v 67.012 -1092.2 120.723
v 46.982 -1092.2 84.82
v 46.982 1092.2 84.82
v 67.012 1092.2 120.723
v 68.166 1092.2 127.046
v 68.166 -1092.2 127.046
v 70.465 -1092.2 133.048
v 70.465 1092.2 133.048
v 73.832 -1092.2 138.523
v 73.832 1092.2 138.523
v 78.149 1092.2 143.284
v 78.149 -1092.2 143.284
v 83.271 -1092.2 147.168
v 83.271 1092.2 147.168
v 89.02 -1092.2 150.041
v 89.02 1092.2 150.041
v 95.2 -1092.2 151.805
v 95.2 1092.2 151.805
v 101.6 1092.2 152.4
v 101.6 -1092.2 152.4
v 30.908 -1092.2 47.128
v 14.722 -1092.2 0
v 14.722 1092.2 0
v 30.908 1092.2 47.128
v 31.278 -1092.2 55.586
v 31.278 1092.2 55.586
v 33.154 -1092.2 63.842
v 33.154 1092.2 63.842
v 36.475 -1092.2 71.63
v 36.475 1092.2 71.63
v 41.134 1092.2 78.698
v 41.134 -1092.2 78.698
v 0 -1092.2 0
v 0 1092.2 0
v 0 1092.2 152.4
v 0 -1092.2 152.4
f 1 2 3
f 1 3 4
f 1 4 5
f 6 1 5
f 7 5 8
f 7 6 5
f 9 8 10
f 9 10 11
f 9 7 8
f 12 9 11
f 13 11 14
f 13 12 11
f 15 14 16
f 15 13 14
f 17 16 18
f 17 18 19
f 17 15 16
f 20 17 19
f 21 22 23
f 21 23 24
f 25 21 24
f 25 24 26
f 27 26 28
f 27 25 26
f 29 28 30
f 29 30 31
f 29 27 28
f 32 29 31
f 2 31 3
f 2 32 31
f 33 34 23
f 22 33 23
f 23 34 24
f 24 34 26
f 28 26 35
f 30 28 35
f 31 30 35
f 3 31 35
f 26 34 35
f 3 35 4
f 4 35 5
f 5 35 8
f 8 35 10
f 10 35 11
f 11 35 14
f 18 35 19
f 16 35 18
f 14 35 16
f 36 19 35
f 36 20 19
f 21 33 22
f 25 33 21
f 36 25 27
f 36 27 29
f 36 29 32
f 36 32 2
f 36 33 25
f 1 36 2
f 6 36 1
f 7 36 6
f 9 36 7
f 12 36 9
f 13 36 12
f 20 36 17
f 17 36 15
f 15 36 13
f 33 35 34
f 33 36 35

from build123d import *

# Parameters (mm, degrees)
F1_DEPTH = 1092.2


with BuildPart() as f1:
    # F0 (on Front) → F1 (new body, symmetric)
    with BuildSketch(Plane.XZ):
        with BuildLine():
            Line((0, 152.4), (0, 0))
            Line((0, 0), (14.721692, 0))
            Line((14.721692, 0), (30.908439, 47.127715))
            ThreePointArc((30.908439, 47.127715), (34.639248, 67.810302), (46.981968, 84.820464))
            Line((46.981968, 84.820464), (67.011952, 120.723277))
            ThreePointArc((67.011952, 120.723277), (78.149265, 143.284197), (101.6, 152.4))
            Line((101.6, 152.4), (0, 152.4))
        make_face()
    extrude(amount=F1_DEPTH, both=True)


solid = f1.part
